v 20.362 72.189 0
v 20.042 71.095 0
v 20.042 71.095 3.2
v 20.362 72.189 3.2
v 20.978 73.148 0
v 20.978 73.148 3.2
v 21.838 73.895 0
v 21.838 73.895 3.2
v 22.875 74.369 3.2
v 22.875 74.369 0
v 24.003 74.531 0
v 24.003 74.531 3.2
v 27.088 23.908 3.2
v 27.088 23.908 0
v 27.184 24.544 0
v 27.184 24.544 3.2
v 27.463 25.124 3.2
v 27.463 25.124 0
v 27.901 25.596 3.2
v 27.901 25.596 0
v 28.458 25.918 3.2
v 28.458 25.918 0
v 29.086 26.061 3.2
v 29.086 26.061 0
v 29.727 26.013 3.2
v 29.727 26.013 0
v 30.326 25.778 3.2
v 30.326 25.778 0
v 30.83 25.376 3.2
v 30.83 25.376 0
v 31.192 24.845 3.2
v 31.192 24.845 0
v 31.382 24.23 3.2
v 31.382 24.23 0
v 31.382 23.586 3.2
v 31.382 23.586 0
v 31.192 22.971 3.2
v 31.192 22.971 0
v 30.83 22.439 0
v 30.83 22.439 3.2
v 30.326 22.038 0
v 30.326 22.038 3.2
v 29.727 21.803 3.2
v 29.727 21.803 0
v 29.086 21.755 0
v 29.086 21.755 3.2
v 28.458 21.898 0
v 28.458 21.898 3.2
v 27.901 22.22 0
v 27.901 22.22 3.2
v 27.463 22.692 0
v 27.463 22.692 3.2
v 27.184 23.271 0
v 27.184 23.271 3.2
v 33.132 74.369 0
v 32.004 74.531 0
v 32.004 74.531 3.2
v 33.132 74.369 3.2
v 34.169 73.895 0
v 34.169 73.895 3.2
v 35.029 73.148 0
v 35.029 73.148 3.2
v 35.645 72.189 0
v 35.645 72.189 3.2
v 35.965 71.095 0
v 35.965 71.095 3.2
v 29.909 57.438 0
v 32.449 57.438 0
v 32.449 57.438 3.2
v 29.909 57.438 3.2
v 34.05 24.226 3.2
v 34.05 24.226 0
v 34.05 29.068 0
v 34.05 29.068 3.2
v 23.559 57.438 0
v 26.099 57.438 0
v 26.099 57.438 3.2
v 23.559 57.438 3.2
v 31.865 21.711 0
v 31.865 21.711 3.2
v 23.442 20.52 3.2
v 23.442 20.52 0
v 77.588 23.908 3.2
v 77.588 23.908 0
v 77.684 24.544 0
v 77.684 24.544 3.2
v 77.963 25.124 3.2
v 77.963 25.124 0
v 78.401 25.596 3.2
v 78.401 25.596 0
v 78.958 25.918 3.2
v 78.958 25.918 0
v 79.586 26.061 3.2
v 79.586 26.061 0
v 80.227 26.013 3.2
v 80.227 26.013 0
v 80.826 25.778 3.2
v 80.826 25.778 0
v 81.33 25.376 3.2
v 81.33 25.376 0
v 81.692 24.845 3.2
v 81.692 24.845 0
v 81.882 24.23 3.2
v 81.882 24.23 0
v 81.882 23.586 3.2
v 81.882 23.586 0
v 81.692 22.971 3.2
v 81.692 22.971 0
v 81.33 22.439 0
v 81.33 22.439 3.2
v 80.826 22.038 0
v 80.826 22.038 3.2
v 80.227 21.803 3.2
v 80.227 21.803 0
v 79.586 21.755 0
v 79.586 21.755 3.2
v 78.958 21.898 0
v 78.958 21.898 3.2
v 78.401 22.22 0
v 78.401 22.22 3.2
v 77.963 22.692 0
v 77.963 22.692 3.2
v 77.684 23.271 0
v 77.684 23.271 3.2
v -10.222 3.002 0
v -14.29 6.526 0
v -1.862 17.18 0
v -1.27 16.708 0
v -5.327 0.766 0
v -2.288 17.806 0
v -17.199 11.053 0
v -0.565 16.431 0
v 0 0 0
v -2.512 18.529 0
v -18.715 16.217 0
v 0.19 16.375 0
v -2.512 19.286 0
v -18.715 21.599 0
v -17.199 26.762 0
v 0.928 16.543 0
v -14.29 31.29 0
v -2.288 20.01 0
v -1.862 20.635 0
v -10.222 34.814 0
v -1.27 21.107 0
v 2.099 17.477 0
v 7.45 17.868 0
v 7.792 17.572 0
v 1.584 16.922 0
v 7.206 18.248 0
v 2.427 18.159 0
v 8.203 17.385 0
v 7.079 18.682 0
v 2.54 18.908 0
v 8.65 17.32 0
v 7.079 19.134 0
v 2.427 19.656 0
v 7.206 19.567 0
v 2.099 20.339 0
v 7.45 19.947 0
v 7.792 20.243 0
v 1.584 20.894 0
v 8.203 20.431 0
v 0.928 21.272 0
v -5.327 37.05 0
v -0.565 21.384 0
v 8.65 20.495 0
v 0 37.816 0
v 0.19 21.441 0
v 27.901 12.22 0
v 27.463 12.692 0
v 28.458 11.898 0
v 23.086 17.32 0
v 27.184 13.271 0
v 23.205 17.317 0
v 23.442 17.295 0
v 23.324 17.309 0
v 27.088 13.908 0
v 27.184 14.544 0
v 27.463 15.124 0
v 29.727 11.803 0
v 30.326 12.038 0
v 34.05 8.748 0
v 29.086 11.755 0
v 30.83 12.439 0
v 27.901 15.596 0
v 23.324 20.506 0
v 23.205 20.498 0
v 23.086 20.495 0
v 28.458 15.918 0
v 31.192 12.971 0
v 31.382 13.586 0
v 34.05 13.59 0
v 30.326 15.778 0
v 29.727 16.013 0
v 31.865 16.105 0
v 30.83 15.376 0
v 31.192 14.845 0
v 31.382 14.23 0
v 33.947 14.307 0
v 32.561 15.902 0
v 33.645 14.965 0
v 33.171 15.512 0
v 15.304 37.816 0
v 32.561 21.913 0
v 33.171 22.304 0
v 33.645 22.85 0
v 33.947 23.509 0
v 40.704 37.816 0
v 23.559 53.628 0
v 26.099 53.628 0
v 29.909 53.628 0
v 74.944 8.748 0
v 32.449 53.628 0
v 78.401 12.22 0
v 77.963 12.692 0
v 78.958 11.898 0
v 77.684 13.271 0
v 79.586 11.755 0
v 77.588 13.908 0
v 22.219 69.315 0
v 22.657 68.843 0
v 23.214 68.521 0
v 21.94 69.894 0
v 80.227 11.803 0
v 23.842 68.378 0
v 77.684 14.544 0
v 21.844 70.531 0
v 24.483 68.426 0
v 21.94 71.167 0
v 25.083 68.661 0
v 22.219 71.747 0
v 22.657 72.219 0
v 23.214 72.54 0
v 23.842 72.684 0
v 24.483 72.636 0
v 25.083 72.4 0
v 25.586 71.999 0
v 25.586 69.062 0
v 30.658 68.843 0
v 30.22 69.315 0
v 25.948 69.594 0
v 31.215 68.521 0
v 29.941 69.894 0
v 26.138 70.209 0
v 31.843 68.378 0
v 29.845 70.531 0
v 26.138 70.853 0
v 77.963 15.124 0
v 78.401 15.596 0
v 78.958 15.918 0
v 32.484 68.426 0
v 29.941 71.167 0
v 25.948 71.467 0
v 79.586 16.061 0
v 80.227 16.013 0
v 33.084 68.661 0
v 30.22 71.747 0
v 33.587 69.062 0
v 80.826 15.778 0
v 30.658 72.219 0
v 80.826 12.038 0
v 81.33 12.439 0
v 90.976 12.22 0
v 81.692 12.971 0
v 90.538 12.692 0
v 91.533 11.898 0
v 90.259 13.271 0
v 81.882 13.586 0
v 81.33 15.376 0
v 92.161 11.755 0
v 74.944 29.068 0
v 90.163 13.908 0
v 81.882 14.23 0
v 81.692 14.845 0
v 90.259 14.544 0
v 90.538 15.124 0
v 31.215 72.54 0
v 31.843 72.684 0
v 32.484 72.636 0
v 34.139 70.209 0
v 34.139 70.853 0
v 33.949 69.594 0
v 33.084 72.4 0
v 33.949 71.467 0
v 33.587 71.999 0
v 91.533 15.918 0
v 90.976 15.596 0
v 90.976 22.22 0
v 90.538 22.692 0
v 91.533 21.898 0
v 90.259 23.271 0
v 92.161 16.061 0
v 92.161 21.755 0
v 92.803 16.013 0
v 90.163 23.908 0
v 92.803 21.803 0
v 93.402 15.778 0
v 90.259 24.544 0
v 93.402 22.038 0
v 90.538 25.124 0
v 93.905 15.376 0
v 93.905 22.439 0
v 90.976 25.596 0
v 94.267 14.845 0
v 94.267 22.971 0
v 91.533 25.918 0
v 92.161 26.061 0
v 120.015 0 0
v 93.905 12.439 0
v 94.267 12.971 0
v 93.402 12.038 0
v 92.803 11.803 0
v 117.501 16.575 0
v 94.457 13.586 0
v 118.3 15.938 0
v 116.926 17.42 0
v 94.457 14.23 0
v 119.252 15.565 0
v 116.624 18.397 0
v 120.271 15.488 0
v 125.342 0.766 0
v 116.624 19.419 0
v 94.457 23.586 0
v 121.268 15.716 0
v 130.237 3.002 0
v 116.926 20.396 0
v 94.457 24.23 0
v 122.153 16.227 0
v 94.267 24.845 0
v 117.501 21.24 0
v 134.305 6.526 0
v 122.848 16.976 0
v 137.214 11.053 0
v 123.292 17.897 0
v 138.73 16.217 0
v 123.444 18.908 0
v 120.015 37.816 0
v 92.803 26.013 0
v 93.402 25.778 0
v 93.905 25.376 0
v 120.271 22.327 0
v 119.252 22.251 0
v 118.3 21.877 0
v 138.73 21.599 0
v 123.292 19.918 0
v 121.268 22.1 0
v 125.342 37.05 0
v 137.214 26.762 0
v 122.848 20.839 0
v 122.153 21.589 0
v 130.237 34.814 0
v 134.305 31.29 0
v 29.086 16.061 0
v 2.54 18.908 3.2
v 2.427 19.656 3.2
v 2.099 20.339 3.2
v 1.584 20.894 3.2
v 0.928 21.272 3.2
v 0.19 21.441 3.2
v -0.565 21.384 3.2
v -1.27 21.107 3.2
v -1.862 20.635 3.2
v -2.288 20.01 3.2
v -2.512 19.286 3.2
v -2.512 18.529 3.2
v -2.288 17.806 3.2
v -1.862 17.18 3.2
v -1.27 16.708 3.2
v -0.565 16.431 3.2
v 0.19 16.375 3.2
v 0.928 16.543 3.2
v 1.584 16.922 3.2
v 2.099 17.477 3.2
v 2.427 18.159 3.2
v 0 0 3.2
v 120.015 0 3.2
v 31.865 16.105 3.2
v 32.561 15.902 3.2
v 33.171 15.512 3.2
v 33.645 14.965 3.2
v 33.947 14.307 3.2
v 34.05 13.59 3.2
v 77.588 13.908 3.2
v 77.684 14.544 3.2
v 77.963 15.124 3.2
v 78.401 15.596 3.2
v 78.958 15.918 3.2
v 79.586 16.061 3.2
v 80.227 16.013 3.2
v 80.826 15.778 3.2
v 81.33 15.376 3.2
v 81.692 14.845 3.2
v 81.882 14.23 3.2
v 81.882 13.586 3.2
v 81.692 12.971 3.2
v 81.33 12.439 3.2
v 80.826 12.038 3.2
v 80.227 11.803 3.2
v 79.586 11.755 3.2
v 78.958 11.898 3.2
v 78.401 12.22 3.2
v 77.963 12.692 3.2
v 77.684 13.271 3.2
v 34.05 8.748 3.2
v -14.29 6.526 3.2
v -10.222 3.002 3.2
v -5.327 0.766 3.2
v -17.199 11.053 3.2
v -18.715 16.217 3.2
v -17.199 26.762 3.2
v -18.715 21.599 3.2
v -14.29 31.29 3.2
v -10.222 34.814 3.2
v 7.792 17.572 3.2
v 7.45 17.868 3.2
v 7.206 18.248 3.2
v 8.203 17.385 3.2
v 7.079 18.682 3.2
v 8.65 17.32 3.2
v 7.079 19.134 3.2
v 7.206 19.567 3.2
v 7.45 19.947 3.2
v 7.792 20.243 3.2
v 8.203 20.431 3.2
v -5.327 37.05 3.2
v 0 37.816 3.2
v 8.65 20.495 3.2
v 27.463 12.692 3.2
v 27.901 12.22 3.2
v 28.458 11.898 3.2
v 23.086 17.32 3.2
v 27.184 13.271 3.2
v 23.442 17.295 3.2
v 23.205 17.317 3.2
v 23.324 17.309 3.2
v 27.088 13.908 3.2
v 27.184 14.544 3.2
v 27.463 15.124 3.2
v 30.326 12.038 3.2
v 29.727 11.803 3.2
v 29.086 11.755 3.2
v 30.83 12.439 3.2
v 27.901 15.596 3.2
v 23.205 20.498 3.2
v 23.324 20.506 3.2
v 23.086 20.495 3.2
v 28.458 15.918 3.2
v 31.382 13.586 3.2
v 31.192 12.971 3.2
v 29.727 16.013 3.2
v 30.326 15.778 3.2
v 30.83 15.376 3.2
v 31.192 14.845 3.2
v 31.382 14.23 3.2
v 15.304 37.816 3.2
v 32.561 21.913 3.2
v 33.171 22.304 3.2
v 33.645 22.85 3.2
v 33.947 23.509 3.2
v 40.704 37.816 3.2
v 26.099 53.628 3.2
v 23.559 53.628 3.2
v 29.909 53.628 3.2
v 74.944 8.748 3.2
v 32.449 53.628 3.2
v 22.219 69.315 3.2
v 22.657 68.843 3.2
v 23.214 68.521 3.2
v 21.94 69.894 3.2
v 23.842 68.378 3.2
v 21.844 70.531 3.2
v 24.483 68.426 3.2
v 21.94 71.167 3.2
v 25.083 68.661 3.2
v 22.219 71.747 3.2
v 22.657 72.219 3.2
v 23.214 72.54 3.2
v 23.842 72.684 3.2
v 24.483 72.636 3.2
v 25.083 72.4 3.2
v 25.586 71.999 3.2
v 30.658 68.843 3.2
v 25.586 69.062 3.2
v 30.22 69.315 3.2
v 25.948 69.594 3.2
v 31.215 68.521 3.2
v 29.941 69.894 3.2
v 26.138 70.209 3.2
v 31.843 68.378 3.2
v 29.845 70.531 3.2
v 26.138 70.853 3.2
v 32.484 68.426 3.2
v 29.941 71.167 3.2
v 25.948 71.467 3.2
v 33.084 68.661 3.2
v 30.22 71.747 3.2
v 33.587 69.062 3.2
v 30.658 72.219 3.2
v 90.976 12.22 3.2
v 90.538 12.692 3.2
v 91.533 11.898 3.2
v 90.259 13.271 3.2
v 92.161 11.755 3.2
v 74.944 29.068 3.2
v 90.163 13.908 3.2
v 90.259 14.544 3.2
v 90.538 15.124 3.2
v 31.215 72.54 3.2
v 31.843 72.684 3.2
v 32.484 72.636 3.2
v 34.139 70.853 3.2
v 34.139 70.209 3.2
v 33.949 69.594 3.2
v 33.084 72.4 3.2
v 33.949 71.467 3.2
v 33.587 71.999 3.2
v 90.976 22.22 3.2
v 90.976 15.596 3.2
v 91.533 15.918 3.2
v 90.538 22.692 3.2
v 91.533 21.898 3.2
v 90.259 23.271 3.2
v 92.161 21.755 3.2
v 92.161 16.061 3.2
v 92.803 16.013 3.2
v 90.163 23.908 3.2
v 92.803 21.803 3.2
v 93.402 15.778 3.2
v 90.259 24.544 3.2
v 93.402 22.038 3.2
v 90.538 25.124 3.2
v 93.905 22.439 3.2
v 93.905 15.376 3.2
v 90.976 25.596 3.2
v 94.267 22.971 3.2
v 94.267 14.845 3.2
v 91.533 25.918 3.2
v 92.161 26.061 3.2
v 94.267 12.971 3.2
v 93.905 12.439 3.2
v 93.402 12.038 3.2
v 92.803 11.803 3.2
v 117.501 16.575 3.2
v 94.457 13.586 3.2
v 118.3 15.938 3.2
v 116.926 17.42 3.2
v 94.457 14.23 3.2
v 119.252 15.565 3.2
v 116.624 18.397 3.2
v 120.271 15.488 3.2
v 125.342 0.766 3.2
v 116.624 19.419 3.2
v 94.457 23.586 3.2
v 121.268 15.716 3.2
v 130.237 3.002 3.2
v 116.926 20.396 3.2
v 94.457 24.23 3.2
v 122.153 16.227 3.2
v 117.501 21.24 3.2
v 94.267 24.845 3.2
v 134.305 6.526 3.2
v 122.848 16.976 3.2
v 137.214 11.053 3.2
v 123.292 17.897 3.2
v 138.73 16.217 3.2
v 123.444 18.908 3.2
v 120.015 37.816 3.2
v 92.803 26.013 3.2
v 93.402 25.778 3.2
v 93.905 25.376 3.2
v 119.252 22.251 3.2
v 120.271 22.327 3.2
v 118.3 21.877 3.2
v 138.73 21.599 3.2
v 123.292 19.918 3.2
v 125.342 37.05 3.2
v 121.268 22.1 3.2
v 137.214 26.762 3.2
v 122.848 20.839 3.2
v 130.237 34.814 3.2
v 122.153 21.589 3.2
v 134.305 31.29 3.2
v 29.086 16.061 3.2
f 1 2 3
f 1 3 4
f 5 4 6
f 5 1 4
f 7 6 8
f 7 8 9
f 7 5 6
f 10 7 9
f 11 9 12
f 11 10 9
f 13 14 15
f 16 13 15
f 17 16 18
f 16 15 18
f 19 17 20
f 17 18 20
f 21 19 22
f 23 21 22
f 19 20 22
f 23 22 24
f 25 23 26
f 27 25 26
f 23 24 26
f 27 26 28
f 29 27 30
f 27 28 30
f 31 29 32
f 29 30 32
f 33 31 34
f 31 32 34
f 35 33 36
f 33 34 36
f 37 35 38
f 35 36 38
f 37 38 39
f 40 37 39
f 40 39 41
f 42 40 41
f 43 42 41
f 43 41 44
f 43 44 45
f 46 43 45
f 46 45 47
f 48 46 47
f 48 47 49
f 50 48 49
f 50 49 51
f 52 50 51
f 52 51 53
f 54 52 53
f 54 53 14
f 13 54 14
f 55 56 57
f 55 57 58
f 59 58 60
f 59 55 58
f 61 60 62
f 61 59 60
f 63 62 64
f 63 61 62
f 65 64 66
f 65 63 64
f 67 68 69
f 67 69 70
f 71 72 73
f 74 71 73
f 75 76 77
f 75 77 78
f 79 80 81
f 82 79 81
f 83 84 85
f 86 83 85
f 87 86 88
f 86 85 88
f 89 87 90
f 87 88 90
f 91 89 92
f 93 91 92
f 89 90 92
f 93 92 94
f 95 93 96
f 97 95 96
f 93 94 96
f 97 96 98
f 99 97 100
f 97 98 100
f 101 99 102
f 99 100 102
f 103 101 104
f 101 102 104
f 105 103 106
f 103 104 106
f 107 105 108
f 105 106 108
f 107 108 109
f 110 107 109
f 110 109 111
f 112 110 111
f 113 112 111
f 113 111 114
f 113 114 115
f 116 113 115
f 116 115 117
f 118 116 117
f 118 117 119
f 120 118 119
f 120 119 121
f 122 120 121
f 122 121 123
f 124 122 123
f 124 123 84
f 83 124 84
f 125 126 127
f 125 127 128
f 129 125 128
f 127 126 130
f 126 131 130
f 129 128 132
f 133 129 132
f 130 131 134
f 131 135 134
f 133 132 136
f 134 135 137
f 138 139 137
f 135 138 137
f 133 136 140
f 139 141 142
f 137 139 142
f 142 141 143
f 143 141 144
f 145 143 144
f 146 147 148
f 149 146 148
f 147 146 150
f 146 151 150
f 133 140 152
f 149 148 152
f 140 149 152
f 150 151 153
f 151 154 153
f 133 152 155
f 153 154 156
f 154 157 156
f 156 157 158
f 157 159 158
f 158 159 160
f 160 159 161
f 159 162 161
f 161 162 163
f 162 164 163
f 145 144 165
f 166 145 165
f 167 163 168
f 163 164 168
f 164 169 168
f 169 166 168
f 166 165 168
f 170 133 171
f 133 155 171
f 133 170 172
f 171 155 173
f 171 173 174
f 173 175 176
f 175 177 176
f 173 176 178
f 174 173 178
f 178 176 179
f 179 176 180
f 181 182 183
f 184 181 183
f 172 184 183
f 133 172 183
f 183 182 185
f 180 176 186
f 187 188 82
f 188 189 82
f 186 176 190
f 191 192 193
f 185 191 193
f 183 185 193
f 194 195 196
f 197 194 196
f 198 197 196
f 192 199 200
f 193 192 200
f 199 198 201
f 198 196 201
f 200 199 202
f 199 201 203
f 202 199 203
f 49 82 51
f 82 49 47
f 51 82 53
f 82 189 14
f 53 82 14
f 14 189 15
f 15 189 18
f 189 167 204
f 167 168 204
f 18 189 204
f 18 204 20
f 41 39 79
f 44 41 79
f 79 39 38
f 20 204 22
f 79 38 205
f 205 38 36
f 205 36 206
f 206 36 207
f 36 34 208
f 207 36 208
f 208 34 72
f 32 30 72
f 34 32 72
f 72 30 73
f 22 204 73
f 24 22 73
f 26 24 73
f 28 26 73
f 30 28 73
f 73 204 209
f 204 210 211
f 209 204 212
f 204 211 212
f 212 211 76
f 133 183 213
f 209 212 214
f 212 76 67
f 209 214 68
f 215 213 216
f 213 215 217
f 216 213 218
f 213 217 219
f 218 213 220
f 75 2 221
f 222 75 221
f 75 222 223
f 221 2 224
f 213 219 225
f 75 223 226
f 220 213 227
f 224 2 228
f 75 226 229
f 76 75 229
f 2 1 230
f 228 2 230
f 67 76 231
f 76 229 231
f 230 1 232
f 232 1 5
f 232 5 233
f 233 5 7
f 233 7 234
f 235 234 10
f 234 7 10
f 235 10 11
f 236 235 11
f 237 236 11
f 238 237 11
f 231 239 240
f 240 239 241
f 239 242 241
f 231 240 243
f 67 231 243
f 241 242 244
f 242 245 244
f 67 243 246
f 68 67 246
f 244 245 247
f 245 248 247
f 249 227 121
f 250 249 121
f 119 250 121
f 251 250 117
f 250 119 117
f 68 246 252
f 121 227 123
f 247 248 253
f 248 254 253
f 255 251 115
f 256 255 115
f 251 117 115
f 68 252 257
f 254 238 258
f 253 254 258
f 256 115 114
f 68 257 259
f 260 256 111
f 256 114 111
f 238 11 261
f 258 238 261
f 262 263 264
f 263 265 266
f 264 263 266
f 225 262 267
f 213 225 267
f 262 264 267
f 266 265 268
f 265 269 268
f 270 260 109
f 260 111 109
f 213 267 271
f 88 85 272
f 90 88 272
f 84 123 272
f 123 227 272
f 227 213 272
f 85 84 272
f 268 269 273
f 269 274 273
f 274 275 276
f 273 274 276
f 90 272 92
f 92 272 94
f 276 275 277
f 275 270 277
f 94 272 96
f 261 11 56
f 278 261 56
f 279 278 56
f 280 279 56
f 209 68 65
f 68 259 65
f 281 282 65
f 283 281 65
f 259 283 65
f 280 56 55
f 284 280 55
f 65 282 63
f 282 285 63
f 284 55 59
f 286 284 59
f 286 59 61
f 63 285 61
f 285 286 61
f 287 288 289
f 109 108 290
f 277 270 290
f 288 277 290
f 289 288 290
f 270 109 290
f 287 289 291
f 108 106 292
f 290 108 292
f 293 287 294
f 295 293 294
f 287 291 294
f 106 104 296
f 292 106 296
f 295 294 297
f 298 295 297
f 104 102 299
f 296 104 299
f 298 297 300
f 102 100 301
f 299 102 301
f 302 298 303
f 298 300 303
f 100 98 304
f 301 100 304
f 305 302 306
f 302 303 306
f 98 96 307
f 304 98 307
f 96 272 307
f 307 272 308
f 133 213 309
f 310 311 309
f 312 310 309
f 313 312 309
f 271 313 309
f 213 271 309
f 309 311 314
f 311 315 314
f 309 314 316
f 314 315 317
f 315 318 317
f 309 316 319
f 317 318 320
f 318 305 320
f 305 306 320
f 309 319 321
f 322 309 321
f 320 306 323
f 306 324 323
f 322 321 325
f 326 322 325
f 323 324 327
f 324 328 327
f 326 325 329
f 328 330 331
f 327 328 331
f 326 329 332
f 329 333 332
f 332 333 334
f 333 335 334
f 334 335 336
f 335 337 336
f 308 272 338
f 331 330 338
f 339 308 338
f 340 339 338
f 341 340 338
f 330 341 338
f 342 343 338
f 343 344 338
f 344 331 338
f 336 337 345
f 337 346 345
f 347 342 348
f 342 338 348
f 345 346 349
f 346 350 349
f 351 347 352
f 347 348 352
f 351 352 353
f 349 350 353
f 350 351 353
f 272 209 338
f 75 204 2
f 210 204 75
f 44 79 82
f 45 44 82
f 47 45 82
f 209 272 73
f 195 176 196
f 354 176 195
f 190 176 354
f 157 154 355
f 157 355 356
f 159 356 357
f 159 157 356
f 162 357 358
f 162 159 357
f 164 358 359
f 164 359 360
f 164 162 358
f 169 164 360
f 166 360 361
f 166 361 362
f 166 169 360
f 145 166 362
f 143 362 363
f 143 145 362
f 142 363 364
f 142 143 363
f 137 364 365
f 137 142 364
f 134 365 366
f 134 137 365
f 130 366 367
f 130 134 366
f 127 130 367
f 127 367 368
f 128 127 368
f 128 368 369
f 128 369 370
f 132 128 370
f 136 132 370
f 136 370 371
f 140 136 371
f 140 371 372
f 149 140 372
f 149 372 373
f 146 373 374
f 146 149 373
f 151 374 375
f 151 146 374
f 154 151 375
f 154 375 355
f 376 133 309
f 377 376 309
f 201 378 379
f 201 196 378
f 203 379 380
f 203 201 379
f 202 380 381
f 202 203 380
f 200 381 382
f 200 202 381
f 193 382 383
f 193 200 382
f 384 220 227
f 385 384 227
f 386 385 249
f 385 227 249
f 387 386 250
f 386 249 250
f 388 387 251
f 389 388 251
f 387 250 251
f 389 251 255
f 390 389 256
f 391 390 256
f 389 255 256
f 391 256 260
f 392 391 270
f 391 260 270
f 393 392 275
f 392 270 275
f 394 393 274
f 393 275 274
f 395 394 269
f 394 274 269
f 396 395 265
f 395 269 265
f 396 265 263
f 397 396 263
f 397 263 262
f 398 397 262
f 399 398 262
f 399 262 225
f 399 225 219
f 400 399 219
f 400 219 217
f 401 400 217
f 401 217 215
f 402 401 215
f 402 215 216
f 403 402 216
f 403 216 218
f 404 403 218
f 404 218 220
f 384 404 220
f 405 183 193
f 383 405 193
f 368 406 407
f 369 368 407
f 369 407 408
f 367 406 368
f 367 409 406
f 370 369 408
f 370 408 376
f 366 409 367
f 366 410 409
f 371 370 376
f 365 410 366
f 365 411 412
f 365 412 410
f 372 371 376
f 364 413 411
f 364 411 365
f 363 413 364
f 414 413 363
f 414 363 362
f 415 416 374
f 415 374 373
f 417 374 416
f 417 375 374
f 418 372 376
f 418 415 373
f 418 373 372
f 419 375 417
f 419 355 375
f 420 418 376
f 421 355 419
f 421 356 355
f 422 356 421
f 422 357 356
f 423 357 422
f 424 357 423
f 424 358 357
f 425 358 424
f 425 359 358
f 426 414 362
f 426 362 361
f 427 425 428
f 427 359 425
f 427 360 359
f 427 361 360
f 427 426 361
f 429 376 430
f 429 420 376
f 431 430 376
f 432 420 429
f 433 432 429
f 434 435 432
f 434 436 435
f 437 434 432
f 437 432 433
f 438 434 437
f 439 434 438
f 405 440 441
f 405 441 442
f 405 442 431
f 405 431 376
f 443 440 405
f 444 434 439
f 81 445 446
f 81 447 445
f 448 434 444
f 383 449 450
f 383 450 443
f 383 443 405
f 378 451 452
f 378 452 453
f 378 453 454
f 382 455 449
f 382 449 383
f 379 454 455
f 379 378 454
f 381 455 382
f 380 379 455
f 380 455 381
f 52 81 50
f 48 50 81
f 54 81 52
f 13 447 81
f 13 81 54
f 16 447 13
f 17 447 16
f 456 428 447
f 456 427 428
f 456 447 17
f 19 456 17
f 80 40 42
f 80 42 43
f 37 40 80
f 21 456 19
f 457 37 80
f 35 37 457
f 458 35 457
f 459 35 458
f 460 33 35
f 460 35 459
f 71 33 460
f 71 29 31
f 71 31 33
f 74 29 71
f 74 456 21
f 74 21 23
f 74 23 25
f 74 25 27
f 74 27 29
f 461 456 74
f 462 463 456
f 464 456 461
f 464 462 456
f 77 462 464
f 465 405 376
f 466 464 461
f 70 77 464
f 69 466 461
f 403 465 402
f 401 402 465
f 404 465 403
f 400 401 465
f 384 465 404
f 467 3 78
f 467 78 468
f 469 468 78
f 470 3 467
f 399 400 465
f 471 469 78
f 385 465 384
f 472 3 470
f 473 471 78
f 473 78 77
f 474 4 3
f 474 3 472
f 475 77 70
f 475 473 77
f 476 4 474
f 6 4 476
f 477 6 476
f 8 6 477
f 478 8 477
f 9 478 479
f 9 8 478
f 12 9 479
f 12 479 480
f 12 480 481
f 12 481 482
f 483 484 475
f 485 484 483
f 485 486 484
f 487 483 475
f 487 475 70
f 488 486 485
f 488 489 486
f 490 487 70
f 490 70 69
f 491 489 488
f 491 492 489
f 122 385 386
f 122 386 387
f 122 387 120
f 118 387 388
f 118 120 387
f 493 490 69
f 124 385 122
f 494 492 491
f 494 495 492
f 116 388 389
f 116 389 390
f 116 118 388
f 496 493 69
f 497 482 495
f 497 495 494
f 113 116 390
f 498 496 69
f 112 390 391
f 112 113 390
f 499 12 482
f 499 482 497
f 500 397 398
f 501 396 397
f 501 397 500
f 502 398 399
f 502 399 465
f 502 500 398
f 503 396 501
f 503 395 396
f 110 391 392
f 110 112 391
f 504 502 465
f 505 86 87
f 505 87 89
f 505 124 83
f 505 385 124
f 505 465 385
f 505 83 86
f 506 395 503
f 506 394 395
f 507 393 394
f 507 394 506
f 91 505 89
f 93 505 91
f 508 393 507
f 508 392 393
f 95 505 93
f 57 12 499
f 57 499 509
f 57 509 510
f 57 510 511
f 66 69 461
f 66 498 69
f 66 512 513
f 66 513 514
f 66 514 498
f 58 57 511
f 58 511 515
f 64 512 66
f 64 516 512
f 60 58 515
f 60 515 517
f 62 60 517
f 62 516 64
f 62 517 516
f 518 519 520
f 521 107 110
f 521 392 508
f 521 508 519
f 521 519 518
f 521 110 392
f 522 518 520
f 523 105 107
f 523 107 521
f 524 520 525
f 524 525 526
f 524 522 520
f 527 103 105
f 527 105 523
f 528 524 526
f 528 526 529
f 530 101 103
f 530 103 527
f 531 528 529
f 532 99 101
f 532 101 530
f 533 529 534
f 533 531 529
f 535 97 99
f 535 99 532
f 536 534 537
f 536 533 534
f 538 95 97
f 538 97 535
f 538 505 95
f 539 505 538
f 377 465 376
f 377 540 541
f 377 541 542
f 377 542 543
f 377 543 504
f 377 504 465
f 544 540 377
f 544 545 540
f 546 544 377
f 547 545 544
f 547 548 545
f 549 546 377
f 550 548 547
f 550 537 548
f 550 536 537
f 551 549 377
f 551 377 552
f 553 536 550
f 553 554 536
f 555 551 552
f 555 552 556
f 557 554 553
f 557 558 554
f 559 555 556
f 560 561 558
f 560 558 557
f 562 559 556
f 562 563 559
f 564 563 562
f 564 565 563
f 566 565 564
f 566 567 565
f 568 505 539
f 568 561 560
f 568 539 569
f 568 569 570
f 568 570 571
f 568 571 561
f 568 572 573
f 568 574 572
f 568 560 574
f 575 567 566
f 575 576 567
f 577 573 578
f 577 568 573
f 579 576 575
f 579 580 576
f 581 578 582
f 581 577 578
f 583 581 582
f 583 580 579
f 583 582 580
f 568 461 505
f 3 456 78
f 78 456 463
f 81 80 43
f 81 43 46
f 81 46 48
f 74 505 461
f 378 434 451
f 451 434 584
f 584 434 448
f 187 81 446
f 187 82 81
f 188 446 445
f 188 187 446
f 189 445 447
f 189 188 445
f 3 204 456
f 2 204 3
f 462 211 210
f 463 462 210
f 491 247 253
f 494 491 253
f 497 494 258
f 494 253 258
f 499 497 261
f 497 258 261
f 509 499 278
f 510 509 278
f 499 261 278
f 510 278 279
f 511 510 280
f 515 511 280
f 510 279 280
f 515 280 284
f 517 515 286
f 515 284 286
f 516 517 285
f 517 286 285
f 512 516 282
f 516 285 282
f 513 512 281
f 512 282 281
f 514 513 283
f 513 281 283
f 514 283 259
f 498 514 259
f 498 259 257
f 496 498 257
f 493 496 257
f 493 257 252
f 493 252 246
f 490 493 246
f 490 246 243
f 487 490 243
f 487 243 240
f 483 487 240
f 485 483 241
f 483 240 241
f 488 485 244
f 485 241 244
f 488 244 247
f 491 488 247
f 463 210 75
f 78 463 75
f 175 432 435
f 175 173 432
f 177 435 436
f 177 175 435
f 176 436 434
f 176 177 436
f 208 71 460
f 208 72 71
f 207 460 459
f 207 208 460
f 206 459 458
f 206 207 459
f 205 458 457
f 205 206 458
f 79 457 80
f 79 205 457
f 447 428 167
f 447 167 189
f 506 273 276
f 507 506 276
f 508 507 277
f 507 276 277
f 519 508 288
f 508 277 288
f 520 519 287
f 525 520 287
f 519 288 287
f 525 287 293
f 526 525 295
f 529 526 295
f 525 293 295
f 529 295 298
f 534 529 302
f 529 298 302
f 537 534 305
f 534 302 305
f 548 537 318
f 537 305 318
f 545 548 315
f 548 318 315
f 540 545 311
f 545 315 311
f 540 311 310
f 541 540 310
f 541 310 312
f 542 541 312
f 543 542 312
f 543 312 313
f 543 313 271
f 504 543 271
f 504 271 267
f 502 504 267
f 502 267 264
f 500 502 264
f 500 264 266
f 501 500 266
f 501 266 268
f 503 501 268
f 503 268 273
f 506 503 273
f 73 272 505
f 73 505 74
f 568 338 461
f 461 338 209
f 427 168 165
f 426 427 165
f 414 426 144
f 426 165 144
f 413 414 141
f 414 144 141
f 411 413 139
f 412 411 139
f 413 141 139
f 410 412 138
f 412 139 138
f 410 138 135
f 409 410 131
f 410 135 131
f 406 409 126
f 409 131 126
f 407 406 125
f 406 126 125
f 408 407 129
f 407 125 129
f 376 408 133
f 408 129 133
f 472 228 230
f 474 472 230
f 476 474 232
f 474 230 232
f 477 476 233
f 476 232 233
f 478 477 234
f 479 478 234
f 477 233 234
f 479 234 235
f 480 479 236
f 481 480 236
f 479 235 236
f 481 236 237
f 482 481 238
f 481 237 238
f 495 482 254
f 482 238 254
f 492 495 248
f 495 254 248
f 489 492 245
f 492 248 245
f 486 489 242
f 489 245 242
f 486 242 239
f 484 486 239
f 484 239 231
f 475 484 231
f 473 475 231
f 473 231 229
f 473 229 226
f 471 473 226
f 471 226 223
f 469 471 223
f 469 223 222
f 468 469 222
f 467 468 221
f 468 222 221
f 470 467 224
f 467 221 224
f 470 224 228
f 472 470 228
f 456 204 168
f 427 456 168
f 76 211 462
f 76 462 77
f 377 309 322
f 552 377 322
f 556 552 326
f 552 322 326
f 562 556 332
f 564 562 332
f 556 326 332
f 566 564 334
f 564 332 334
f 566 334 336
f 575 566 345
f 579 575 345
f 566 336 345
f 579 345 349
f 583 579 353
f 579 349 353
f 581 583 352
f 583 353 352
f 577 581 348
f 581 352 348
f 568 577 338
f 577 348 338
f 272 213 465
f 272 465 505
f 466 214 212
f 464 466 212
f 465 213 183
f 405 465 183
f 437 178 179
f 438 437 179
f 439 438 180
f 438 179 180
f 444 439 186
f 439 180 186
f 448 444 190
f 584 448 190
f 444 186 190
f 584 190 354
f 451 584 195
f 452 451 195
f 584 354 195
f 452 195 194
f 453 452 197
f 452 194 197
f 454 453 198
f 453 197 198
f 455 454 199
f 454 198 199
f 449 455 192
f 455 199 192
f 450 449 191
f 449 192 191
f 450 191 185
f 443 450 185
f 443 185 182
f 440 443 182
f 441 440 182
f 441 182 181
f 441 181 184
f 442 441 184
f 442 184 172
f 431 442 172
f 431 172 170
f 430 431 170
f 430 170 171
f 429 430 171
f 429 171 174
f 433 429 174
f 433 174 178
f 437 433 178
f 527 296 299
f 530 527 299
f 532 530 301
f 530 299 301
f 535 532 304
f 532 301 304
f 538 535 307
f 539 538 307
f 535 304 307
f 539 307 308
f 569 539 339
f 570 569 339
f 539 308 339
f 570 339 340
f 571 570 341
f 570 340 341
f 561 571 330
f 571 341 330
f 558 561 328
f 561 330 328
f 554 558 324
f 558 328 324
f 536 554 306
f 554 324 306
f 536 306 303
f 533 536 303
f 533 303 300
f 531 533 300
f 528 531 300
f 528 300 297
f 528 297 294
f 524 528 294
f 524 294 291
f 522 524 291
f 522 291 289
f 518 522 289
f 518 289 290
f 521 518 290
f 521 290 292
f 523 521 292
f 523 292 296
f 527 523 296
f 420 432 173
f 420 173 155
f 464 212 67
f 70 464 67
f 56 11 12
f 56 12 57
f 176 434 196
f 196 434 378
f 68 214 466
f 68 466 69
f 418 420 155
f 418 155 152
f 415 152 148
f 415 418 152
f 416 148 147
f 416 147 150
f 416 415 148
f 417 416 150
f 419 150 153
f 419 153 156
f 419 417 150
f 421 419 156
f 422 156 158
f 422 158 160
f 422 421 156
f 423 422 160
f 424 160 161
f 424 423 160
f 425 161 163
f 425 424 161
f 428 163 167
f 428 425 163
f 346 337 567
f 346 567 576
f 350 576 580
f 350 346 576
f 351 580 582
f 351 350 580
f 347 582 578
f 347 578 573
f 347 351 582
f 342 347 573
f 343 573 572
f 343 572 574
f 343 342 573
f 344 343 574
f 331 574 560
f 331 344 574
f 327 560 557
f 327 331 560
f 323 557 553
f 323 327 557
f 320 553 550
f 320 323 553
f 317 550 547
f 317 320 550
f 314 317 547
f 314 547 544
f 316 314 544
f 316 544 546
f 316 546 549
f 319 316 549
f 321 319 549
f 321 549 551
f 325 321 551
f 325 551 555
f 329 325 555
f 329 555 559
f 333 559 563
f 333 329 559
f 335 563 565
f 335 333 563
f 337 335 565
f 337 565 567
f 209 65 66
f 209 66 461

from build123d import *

# Parameters (mm, degrees)
SKETCH1_R           = 3.429
SKETCH1_R_2         = 2.54
BOSS_EXTRUDE1_DEPTH = 3.2004
SKETCH5_R           = 2.159
SKETCH5_W           = 40.894
SKETCH5_H           = 20.32
CUT_EXTRUDE3_DEPTH  = 4.2004
CUT_EXTRUDE4_DEPTH  = 3.2004
CUT_EXTRUDE5_DEPTH  = 3.2004
SKETCH9_R           = 2.159
SKETCH9_W           = 2.54
SKETCH9_H           = 3.81
BOSS_EXTRUDE2_DEPTH = 3.2004
FILLET1_R           = 2.54


with BuildPart() as part:
    # Sketch1 → Boss-Extrude1 (new body)
    with BuildSketch(Plane.XY):
        with BuildLine():
            Line((120.015, 37.81552), (0, 37.81552))
            ThreePointArc((0, 37.81552), (-18.90776, 18.90776), (0, 0))
            Line((0, 0), (120.015, 0))
            ThreePointArc((120.015, 0), (138.92276, 18.90776), (120.015, 37.81552))
        make_face()
        with Locations((120.015, 18.90776)):
            Circle(SKETCH1_R, mode=Mode.SUBTRACT)
        with Locations((0, 18.90776)):
            Circle(SKETCH1_R_2, mode=Mode.SUBTRACT)
    extrude(amount=BOSS_EXTRUDE1_DEPTH)

    # Sketch5 → Cut-Extrude3 (cut, through all)
    with BuildSketch(Plane(origin=(0, 0, 0), x_dir=(-1, 0, 0), z_dir=(0, 0, -1))):
        with Locations((-79.746999972, 23.90776)):
            Circle(SKETCH5_R)
        with Locations((-29.246999972, 13.90776)):
            Circle(SKETCH5_R)
        with Locations((-29.246999972, 23.90776)):
            Circle(SKETCH5_R)
        with Locations((-79.746999972, 13.90776)):
            Circle(SKETCH5_R)
        with Locations((-92.322240346, 23.90776)):
            Circle(SKETCH5_R)
        with Locations((-92.322240346, 13.90776)):
            Circle(SKETCH5_R)
        with Locations((-54.496999972, 18.90776)):
            Rectangle(SKETCH5_W, SKETCH5_H)
    extrude(amount=-CUT_EXTRUDE3_DEPTH, mode=Mode.SUBTRACT)

    # Sketch6 → Cut-Extrude4 (cut)
    with BuildSketch(Plane.XY.offset(3.2004)):
        with BuildLine():
            Line((8.649999972, 20.49526), (25.159999972, 20.49526))
            ThreePointArc((25.159999972, 20.49526), (26.747499972, 18.90776), (25.159999972, 17.32026))
            Line((25.159999972, 17.32026), (8.649999972, 17.32026))
            ThreePointArc((8.649999972, 17.32026), (7.062499972, 18.90776), (8.649999972, 20.49526))
        make_face()
    extrude(amount=-CUT_EXTRUDE4_DEPTH, mode=Mode.SUBTRACT)

    # Sketch8 → Cut-Extrude5 (cut)
    with BuildSketch(Plane.XY.offset(3.2004)):
        Polygon((34.049999972, 15.79626), (34.049999972, 22.01926), (23.264769203, 20.49526), (23.264769203, 17.32026), align=None)
    extrude(amount=-CUT_EXTRUDE5_DEPTH, mode=Mode.SUBTRACT)

    # Sketch9 → Boss-Extrude2 (add)
    with BuildSketch(Plane(origin=(0, 0, 0), x_dir=(-1, 0, 0), z_dir=(0, 0, -1))):
        with BuildLine():
            Line((-40.703500071, 37.81552), (-15.303500071, 37.81552))
            Line((-15.303500071, 37.81552), (-20.042454023, 71.094701578))
            ThreePointArc((-20.042454023, 71.094701578), (-21.381188491, 73.552326238), (-24.003000071, 74.531219996))
            Line((-24.003000071, 74.531219996), (-32.004000071, 74.531219996))
            ThreePointArc((-32.004000071, 74.531219996), (-34.62581165, 73.552326238), (-35.964546118, 71.094701578))
            Line((-35.964546118, 71.094701578), (-40.703500071, 37.81552))
        make_face()
        with Locations((-32.004000071, 70.53072)):
            Circle(SKETCH9_R, mode=Mode.SUBTRACT)
        with Locations((-24.003000071, 70.53072)):
            Circle(SKETCH9_R, mode=Mode.SUBTRACT)
        with Locations((-31.178500071, 55.533488225)):
            Rectangle(SKETCH9_W, SKETCH9_H, mode=Mode.SUBTRACT)
        with Locations((-24.828500071, 55.533488225)):
            Rectangle(SKETCH9_W, SKETCH9_H, mode=Mode.SUBTRACT)
    extrude(amount=-BOSS_EXTRUDE2_DEPTH)

    # Fillet1
    fillet1_edges = [part.edges().sort_by_distance(p)[0] for p in [
        (34.049999972, 22.01926, 1.6002),
        (23.264769203, 20.49526, 1.6002),
        (23.264769203, 17.32026, 1.6002),
        (34.049999972, 15.79626, 1.6002),
    ]]
    fillet(fillet1_edges, radius=FILLET1_R)


solid = part.part
